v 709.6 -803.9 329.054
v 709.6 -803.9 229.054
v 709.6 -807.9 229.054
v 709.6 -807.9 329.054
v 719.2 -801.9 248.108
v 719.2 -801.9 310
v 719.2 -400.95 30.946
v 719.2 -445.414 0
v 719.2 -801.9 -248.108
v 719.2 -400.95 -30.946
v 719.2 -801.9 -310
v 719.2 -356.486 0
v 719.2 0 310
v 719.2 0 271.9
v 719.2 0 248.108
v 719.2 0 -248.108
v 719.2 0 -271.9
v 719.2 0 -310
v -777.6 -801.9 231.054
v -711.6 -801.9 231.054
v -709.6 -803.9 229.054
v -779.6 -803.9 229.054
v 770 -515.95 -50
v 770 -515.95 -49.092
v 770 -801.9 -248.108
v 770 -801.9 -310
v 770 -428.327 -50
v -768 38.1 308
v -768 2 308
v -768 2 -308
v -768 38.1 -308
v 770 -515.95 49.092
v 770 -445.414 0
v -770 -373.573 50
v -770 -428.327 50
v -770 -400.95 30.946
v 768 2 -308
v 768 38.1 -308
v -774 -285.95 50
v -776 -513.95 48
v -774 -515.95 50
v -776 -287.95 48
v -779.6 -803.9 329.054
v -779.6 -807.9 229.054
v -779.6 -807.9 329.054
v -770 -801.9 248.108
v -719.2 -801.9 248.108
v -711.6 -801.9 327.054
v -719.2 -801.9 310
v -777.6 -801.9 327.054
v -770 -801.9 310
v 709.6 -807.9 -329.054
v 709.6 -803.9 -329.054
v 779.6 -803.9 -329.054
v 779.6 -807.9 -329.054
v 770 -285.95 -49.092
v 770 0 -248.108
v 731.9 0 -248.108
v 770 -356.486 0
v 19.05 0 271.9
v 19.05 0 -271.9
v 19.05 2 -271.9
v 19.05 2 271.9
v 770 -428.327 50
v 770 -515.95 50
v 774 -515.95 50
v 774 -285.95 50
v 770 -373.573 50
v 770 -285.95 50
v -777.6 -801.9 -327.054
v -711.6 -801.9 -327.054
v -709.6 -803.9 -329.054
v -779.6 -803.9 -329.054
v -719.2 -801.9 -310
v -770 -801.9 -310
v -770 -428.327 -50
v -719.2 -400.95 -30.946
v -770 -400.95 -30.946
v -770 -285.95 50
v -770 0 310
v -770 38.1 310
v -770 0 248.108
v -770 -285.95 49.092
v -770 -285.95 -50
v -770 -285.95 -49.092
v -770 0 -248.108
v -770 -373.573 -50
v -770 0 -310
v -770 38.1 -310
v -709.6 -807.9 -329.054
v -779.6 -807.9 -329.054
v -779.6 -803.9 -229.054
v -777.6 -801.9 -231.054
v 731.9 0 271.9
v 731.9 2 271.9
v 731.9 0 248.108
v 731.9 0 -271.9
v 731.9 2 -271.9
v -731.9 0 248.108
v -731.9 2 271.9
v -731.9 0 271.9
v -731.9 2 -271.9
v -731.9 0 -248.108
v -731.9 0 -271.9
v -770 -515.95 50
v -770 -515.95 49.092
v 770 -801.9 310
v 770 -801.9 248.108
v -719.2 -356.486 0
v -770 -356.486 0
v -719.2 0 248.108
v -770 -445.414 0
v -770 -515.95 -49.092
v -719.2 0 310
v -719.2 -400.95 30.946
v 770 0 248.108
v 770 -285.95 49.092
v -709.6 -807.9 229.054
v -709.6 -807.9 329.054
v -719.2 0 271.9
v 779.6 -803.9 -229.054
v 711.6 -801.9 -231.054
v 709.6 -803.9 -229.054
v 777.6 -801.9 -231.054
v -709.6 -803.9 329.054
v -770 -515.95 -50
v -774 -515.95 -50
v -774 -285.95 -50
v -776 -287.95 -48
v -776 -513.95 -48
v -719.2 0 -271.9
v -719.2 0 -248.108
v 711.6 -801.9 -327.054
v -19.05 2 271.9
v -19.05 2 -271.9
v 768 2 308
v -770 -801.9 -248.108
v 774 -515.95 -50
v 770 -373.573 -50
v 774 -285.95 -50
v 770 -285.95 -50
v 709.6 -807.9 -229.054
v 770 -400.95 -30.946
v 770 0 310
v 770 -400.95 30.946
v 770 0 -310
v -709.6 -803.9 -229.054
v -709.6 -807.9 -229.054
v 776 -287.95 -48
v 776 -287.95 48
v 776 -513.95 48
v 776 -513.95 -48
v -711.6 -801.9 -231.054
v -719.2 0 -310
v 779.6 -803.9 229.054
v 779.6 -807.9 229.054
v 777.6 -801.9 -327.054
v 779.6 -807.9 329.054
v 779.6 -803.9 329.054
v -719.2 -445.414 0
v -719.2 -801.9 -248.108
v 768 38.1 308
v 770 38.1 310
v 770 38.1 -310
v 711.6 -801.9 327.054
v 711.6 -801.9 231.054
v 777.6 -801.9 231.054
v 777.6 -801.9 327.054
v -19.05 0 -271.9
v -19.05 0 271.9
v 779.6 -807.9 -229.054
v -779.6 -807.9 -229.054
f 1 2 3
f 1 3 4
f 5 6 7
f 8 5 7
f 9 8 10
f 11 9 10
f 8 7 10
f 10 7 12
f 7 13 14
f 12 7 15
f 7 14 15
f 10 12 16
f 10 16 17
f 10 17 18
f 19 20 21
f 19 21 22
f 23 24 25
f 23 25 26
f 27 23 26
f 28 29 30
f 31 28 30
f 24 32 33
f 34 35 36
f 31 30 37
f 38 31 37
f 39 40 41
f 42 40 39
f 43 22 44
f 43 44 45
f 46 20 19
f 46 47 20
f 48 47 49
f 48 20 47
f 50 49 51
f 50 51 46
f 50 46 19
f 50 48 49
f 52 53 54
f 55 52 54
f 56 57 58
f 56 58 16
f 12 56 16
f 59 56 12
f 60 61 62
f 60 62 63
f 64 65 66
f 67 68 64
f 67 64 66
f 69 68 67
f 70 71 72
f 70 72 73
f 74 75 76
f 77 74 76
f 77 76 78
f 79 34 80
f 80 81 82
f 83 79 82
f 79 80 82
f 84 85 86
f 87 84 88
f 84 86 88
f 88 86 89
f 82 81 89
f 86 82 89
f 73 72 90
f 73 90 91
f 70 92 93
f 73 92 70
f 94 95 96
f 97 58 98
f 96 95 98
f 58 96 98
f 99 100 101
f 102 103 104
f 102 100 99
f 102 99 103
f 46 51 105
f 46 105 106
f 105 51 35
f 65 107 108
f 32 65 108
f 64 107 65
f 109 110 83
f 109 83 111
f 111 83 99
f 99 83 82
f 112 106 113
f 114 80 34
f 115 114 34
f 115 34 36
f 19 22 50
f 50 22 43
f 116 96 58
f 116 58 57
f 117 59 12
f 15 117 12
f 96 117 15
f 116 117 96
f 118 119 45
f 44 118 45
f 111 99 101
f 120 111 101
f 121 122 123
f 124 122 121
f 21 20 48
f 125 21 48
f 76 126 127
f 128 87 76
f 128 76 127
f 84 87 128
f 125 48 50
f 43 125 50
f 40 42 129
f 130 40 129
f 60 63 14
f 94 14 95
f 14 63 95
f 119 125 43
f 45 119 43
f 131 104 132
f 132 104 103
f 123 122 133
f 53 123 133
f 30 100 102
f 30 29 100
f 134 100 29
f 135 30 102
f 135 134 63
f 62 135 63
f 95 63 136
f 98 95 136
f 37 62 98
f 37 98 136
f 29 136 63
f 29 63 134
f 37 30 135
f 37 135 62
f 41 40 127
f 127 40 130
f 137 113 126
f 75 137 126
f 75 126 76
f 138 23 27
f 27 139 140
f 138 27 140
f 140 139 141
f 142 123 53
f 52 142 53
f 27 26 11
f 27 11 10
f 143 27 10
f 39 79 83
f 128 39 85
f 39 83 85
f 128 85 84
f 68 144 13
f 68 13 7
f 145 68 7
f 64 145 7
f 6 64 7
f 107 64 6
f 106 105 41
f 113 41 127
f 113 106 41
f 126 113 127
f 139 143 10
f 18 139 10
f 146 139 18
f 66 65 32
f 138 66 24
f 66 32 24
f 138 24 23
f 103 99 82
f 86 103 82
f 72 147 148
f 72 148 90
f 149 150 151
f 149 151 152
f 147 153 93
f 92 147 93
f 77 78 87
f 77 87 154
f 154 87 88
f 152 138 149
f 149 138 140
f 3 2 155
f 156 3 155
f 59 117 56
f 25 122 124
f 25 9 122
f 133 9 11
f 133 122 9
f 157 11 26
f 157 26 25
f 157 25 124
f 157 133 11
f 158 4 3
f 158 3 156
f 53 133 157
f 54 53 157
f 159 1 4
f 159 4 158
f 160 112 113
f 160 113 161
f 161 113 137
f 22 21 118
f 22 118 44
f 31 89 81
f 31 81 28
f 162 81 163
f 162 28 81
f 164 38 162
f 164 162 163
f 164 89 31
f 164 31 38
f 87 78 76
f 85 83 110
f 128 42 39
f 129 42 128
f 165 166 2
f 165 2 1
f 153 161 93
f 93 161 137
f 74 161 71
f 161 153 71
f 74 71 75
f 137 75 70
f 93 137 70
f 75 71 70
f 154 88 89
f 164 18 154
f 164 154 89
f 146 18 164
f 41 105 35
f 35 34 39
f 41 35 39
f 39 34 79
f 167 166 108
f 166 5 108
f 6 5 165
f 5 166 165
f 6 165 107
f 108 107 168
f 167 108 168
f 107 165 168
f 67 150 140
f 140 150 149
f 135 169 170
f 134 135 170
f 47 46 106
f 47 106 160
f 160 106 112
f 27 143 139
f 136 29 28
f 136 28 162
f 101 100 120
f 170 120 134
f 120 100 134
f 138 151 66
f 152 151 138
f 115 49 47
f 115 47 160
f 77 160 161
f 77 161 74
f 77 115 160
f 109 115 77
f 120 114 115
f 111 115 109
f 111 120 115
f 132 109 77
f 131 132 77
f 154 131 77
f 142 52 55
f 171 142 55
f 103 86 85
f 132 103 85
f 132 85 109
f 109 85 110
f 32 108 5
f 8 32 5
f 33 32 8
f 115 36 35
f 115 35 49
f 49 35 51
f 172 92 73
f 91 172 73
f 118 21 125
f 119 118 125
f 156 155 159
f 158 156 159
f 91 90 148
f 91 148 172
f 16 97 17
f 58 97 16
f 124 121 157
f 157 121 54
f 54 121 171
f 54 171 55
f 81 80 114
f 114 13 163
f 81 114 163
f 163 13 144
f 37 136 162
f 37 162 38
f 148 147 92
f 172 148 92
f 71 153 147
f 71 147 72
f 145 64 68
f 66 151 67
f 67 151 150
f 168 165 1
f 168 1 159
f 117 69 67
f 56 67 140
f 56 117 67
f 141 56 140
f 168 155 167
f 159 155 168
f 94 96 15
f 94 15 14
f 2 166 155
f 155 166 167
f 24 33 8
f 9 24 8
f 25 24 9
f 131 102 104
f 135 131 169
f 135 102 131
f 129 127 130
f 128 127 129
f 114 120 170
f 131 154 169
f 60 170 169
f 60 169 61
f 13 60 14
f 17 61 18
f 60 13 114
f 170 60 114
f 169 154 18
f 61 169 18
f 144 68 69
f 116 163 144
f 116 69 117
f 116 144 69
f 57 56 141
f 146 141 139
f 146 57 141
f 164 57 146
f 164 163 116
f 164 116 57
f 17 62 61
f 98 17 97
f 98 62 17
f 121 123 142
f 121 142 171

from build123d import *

# Parameters (mm, degrees)
CROQUIS1_W                 = 1540
CROQUIS1_H                 = 620
SALIENTE_EXTRUIR1_DEPTH    = 38.1
VACIADO1_T                 = -2
CROQUIS2_W                 = 1463.8
CROQUIS2_H                 = 543.8
CORTAR_EXTRUIR1_DEPTH      = 38.1
SALIENTE_EXTRUIR2_DEPTH    = 50.8
CROQUIS4_W                 = 100
CROQUIS4_H                 = 230
SALIENTE_EXTRUIR3_DEPTH    = 6
CHAFL_N1_SIZE              = 2
CROQUIS5_W                 = 70
CROQUIS5_H                 = 100
SALIENTE_EXTRUIR4_DEPTH    = 6
CHAFL_N2_SIZE              = 2
CHAFL_N2_OF_SIMETR_A2_SIZE = 2
CROQUIS6_W                 = 38.1
CROQUIS6_H                 = 543.8
SALIENTE_EXTRUIR5_DEPTH    = 2


# Read off the part's stored shape, not the designer's step: Simetría3
with BuildPart() as part:
    # Croquis1 → Saliente-Extruir1 (new body)
    with BuildSketch(Plane(origin=(0, 0, 0), x_dir=(1, 0, 0), z_dir=(0, 1, 0))):
        Rectangle(CROQUIS1_W, CROQUIS1_H)
    extrude(amount=SALIENTE_EXTRUIR1_DEPTH)

    # Vaciado1
    vaciado1_openings = [part.faces().sort_by_distance(p)[0] for p in [
        (0, 38.1, 0),
    ]]
    offset(amount=VACIADO1_T, openings=vaciado1_openings, kind=Kind.INTERSECTION)

    # Croquis2 → Cortar-Extruir1 (cut)
    with BuildSketch(Plane(origin=(0, 2, 0), x_dir=(1, 0, 0), z_dir=(0, 1, 0))):
        Rectangle(CROQUIS2_W, CROQUIS2_H)
    extrude(amount=-CORTAR_EXTRUIR1_DEPTH, mode=Mode.SUBTRACT)

    # Croquis3 → Saliente-Extruir2 (add)
    with BuildSketch(Plane(origin=(770, 0, 0), x_dir=(0, 0, -1), z_dir=(1, 0, 0))):
        Polygon((-310, 0), (-30.946230524, -400.95), (-310, -801.9), (-248.107538953, -801.9), (0, -445.414158831), (248.107538953, -801.9), (310, -801.9), (30.946230524, -400.95), (310, 0), (248.107538953, 0), (0, -356.485841169), (-248.107538953, 0), align=None)
    extrude(amount=-SALIENTE_EXTRUIR2_DEPTH)

    # Croquis4 → Saliente-Extruir3 (add)
    with BuildSketch(Plane(origin=(770, 0, 0), x_dir=(0, 0, -1), z_dir=(1, 0, 0))):
        with Locations((0, -400.95)):
            Rectangle(CROQUIS4_W, CROQUIS4_H)
    extrude(amount=SALIENTE_EXTRUIR3_DEPTH)

    # Chaflán1
    chafl_n1_edges = [part.edges().sort_by_distance(p)[0] for p in [
        (776, -400.95, -50),
        (776, -285.95, 0),
        (776, -400.95, 50),
        (776, -515.95, 0),
    ]]
    chamfer(chafl_n1_edges, length=CHAFL_N1_SIZE)

    # Croquis5 → Saliente-Extruir4 (add)
    with BuildSketch(Plane.XZ.offset(801.9)):
        with Locations((744.6, 279.053769476)):
            Rectangle(CROQUIS5_W, CROQUIS5_H)
    saliente_extruir4 = extrude(amount=SALIENTE_EXTRUIR4_DEPTH)

    # Chaflán2
    chafl_n2_edges = [part.edges().sort_by_distance(p)[0] for p in [
        (779.6, -801.9, 279.053769476),
        (744.6, -801.9, 329.053769476),
        (709.6, -801.9, 279.053769476),
        (744.6, -801.9, 229.053769476),
    ]]
    chamfer(chafl_n2_edges, length=CHAFL_N2_SIZE)

    # Simetría2: Saliente-Extruir4 across plane
    add(saliente_extruir4.mirror(Plane.XY))

    # Chaflán2 of Simetría2
    chafl_n2_of_simetr_a2_edges = [part.edges().sort_by_distance(p)[0] for p in [
        (779.6, -801.9, -279.053769476),
        (744.6, -801.9, -329.053769476),
        (709.6, -801.9, -279.053769476),
        (744.6, -801.9, -229.053769476),
    ]]
    chamfer(chafl_n2_of_simetr_a2_edges, length=CHAFL_N2_OF_SIMETR_A2_SIZE)

    # Croquis6 → Saliente-Extruir5 (add)
    with BuildSketch(Plane.XZ):
        Rectangle(CROQUIS6_W, CROQUIS6_H)
    extrude(amount=-SALIENTE_EXTRUIR5_DEPTH)

    # Simetría3: part across plane


with BuildPart() as part_1:
    add(part.part)
    add(part.part.mirror(Plane(origin=(0, 0, 0), x_dir=(0, 0, 1), z_dir=(1, 0, 0))))


solid = part_1.part
